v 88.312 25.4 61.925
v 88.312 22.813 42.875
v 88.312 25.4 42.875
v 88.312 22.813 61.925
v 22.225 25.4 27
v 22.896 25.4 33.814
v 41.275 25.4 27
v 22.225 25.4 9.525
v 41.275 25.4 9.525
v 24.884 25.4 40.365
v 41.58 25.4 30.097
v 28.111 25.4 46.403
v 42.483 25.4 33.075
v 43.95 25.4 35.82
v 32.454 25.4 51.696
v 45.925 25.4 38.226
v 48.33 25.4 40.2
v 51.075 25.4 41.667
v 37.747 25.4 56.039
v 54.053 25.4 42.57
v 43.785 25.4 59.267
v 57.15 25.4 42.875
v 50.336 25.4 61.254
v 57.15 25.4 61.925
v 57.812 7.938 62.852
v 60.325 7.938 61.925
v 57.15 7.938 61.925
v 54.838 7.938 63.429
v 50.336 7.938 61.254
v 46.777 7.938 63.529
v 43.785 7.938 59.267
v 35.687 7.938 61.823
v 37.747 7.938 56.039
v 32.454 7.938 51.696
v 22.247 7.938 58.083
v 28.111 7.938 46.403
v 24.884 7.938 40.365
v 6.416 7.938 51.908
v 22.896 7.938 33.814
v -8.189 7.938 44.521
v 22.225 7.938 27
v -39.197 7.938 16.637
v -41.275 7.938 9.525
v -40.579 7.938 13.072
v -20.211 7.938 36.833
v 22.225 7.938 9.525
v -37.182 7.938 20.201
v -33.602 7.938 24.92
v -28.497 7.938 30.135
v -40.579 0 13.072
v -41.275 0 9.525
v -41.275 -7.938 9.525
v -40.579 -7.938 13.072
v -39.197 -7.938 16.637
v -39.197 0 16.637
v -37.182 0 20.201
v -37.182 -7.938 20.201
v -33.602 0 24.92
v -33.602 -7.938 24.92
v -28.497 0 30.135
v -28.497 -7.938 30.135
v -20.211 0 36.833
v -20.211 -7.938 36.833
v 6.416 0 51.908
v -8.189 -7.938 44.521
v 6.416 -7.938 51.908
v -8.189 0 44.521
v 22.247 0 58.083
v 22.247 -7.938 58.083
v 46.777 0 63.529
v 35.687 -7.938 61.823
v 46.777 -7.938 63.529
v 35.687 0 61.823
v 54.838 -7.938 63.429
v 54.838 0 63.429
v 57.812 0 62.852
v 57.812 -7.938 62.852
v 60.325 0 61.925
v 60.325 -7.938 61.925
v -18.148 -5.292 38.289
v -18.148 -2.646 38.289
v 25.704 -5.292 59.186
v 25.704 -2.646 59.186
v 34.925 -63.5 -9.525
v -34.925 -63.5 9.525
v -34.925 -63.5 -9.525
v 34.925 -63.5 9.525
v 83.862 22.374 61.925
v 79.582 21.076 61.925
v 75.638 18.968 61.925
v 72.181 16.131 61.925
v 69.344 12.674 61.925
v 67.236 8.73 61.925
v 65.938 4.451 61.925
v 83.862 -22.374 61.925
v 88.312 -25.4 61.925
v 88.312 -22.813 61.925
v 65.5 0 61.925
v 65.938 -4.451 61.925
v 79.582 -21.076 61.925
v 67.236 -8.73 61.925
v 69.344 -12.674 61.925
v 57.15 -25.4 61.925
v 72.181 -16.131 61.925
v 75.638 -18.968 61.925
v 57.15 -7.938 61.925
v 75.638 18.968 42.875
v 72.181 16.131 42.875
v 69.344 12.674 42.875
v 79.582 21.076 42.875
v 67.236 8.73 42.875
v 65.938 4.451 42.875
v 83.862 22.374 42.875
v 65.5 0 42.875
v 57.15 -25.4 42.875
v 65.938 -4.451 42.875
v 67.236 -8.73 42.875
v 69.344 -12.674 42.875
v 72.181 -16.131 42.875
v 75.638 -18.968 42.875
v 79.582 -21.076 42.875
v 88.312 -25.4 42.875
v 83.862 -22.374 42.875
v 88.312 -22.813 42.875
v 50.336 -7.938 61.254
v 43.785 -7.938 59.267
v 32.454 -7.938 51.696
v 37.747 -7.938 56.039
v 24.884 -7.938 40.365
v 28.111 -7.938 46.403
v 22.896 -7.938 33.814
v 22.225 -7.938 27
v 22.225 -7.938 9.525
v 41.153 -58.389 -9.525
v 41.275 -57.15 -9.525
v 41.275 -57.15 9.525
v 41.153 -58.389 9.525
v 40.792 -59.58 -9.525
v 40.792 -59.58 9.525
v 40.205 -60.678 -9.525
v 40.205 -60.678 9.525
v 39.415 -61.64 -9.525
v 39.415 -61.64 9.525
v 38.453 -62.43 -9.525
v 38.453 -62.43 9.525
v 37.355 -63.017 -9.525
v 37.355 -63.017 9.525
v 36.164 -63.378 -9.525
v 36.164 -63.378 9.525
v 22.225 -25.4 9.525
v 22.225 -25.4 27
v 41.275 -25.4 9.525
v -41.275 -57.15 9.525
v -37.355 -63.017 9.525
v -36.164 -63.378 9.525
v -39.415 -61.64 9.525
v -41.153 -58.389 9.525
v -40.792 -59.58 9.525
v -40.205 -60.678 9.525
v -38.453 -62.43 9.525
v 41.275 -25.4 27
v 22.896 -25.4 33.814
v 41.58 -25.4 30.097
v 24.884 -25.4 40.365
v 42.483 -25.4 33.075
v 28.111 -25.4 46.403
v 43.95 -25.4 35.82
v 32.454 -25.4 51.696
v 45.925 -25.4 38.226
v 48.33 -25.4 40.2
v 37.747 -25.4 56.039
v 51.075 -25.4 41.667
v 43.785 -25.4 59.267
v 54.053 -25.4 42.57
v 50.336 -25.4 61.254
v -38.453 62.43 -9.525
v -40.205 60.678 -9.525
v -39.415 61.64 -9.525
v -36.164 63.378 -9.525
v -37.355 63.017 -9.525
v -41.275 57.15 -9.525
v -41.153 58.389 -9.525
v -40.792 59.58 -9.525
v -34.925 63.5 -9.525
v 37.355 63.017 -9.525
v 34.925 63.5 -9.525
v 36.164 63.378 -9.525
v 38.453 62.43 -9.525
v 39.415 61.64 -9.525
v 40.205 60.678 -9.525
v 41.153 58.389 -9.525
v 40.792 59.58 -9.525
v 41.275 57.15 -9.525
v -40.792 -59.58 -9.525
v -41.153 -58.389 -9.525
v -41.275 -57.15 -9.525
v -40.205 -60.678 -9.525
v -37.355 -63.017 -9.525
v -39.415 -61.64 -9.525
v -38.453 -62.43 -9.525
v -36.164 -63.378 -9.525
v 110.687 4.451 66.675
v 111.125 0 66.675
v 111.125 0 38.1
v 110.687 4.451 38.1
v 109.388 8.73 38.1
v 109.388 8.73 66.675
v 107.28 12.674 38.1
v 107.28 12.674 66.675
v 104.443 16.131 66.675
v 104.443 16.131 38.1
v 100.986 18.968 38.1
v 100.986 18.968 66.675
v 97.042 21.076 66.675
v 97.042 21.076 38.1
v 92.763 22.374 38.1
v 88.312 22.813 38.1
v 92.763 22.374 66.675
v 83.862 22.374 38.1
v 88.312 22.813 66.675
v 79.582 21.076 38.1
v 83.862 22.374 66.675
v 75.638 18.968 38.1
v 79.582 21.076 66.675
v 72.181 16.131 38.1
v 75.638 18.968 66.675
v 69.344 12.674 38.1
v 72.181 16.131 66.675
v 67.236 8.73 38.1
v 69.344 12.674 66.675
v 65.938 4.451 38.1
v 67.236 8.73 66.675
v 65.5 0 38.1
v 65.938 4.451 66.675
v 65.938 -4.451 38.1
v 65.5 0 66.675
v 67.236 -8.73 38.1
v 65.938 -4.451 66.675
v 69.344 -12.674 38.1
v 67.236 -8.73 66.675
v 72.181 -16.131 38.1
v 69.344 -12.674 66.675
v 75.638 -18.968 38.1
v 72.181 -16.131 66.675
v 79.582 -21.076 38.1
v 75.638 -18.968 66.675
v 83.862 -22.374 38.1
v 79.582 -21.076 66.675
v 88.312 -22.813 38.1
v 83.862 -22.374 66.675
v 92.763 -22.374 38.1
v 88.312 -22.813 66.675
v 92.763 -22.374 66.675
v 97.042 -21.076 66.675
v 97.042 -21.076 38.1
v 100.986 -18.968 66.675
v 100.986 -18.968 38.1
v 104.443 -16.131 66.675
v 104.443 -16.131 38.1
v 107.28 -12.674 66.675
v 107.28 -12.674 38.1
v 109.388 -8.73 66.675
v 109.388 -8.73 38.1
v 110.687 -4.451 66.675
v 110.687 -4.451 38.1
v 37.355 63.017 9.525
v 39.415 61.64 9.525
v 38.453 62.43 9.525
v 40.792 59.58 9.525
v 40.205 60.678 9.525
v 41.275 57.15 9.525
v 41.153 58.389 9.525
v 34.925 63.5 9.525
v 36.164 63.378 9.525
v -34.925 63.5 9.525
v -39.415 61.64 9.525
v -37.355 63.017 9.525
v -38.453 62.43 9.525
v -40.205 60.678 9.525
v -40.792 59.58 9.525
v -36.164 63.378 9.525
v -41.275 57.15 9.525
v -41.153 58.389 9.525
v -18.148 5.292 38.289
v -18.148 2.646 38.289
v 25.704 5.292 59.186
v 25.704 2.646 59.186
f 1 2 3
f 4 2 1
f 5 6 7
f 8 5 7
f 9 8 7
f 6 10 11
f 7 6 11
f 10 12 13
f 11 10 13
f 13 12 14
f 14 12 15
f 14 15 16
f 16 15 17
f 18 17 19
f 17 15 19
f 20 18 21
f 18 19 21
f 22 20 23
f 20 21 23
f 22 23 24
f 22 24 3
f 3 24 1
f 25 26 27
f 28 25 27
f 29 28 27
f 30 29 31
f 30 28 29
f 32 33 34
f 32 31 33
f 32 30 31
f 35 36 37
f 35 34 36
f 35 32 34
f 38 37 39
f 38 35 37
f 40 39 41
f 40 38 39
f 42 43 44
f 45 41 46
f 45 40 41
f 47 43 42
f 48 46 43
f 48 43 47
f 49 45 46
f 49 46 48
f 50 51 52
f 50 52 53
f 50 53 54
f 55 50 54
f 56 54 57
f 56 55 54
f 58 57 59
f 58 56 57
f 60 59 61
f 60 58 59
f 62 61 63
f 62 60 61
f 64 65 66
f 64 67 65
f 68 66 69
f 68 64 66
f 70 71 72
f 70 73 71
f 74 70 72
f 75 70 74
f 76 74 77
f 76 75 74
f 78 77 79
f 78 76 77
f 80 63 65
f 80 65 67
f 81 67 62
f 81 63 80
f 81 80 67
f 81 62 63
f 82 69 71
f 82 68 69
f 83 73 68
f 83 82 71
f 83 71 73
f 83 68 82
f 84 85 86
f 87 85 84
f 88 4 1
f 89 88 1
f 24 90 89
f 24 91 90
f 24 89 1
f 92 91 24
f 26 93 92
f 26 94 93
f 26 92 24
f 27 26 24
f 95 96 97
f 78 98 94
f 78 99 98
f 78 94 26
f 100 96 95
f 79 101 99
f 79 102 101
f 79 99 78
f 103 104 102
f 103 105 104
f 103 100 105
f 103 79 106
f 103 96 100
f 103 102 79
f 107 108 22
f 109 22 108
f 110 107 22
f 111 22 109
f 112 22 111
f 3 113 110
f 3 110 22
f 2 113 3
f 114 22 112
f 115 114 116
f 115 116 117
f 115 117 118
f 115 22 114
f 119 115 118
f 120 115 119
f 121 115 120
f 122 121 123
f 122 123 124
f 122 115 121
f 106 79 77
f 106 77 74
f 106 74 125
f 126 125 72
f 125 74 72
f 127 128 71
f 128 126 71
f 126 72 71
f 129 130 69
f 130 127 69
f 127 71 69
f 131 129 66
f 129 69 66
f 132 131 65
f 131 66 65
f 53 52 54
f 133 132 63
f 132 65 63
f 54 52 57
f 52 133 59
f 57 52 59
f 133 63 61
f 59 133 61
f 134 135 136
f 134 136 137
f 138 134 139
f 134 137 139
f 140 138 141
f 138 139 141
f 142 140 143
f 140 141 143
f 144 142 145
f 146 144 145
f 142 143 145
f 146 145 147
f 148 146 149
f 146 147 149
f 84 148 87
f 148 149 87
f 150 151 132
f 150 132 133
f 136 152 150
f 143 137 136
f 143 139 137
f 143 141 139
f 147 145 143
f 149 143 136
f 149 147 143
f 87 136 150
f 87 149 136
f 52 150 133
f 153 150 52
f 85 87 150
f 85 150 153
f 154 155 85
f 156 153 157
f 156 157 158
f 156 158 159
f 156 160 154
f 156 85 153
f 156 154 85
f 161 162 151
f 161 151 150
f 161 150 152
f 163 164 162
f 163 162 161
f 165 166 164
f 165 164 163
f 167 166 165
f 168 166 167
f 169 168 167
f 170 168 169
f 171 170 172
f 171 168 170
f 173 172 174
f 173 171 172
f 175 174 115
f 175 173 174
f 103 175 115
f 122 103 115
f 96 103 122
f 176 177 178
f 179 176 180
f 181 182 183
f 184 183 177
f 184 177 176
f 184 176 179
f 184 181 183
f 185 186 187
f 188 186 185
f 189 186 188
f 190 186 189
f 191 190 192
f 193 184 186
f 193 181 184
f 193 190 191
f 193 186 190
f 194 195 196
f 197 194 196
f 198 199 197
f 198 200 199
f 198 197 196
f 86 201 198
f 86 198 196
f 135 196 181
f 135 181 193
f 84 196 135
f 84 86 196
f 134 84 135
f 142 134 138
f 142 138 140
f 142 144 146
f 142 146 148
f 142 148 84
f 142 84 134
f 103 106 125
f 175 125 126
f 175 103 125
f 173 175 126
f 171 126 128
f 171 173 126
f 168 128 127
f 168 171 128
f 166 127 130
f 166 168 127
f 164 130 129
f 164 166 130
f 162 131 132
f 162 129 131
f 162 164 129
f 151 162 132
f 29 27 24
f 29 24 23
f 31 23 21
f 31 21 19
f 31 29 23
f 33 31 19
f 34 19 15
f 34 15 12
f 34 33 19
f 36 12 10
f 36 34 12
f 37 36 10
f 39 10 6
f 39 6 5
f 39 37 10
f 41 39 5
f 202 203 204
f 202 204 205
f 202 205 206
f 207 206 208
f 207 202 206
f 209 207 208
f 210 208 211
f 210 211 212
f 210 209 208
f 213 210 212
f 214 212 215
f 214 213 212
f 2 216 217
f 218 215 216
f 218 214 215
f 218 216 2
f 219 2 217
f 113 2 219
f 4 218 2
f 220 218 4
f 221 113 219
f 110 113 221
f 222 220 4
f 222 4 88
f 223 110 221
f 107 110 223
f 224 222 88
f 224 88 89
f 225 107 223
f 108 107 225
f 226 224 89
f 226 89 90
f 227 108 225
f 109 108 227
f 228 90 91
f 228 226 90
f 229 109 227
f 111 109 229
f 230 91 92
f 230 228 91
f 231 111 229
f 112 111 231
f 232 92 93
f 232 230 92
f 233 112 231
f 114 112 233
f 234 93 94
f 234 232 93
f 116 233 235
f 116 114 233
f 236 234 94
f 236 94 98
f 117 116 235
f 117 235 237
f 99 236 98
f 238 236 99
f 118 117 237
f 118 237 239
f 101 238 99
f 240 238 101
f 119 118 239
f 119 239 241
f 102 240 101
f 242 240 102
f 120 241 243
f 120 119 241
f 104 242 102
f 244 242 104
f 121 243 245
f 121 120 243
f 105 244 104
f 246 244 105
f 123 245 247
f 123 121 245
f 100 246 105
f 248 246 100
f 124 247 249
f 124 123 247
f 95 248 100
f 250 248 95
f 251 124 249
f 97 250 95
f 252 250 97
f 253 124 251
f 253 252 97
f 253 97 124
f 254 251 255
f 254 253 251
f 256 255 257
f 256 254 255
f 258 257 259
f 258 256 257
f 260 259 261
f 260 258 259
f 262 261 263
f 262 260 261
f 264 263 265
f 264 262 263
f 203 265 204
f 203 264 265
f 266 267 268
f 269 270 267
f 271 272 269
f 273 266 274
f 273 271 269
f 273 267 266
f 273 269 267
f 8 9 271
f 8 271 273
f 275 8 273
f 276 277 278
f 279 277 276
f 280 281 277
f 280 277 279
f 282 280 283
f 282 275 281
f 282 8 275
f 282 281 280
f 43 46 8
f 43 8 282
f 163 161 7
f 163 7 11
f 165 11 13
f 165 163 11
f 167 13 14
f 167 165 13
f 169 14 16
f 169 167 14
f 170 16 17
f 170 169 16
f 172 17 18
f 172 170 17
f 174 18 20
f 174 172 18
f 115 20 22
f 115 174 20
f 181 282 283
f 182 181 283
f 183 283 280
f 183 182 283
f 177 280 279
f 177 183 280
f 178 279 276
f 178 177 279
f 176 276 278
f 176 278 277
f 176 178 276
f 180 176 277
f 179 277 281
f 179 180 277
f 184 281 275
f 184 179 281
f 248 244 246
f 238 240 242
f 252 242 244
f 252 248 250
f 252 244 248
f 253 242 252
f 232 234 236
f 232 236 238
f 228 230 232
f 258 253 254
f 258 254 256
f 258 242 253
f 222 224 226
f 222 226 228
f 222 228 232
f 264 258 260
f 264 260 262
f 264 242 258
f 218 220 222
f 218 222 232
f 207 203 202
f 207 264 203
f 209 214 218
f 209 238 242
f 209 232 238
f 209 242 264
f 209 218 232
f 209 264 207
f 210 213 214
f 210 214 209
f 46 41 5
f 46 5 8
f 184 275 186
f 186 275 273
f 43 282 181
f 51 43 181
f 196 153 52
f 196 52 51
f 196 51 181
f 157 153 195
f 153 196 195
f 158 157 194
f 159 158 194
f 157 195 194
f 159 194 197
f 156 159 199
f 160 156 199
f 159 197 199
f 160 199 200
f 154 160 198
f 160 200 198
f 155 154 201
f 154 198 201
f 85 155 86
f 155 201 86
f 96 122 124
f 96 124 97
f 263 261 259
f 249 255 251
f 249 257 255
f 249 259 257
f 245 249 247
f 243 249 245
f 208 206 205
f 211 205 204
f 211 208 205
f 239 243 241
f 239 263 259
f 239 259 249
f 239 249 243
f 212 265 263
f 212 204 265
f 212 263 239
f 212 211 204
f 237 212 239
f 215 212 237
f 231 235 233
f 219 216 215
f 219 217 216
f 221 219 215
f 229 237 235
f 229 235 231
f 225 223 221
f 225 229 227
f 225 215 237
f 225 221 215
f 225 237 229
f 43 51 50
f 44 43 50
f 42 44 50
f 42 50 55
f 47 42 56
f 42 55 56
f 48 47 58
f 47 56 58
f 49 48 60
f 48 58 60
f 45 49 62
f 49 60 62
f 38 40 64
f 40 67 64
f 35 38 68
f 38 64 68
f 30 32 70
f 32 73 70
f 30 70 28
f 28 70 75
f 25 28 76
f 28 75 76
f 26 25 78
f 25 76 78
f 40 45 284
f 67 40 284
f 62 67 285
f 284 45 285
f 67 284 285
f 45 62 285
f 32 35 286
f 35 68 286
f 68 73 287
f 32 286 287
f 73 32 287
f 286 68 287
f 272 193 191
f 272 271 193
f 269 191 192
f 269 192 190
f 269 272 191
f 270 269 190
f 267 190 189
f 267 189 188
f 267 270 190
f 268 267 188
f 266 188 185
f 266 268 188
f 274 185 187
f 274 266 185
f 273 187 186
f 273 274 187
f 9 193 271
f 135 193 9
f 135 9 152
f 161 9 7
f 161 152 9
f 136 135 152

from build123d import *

# Parameters (mm, degrees)
F1_DEPTH = 63.5
F0_W     = 27.987413
F0_H     = 19.05
F2_DEPTH = 25.4
F3_DEPTH = 7.9375
F5_R     = 6.35


with BuildPart() as f1:
    # F0 (on Front) → F1 (new body, symmetric)
    with BuildSketch(Plane.XZ):
        Polygon((22.225, 9.525), (-41.275, 9.525), (-41.275, -9.525), (41.275, -9.525), (41.275, 9.525), align=None)
    extrude(amount=F1_DEPTH, both=True)

    # F0 (on Front) → F2 (join, symmetric)
    with BuildSketch(Plane.XZ):
        with BuildLine():
            Line((22.225, 27.0002), (22.225, 9.525))
            Line((22.225, 9.525), (41.275, 9.525))
            Line((41.275, 9.525), (41.275, 27.0002))
            ThreePointArc((41.275, 27.0002), (45.92468, 38.22552), (57.15, 42.8752))
            Line((57.15, 42.8752), (60.325, 42.8752))
            Line((60.325, 42.8752), (60.325, 61.9252))
            Line((60.325, 61.9252), (57.15, 61.9252))
            ThreePointArc((57.15, 61.9252), (32.454296, 51.695904), (22.225, 27.0002))
        make_face()
        with Locations((74.318706, 52.4002)):
            Rectangle(F0_W, F0_H)
    extrude(amount=F2_DEPTH, both=True)

    # F0 (on Front) → F3 (join, symmetric)
    with BuildSketch(Plane.XZ):
        with BuildLine():
            add(Edge.make_bspline(
                [(-41.275, 9.525), (-38.495697, 38.790718), (40.304676, 71.696699), (60.325, 61.9252)],
                knots=[0, 0, 0, 0, 114.316845, 114.316845, 114.316845, 114.316845], degree=3))
            Line((-41.275, 9.525), (22.225, 9.525))
            Line((22.225, 9.525), (22.225, 27.0002))
            ThreePointArc((22.225, 27.0002), (32.454296, 51.695904), (57.15, 61.9252))
            Line((57.15, 61.9252), (60.325, 61.9252))
        make_face()
    extrude(amount=F3_DEPTH, both=True)

    # F0 (on Front) → F4 (revolve)
    with BuildSketch(Plane.XZ):
        Polygon((88.312413, 66.675), (88.312413, 61.9252), (88.312413, 42.8752), (88.312413, 38.1), (111.125, 38.1), (111.125, 66.675), align=None)
    revolve(axis=Axis((88.312413, 0, 54.7751), (0, 0, 1)))

    # F5
    f5_edges = [f1.edges().sort_by_distance(p)[0] for p in [
        (-41.275, -63.5, 0),
        (41.275, -63.5, 0),
        (-41.275, 63.5, 0),
        (41.275, 63.5, 0),
    ]]
    fillet(f5_edges, radius=F5_R)


solid = f1.part
